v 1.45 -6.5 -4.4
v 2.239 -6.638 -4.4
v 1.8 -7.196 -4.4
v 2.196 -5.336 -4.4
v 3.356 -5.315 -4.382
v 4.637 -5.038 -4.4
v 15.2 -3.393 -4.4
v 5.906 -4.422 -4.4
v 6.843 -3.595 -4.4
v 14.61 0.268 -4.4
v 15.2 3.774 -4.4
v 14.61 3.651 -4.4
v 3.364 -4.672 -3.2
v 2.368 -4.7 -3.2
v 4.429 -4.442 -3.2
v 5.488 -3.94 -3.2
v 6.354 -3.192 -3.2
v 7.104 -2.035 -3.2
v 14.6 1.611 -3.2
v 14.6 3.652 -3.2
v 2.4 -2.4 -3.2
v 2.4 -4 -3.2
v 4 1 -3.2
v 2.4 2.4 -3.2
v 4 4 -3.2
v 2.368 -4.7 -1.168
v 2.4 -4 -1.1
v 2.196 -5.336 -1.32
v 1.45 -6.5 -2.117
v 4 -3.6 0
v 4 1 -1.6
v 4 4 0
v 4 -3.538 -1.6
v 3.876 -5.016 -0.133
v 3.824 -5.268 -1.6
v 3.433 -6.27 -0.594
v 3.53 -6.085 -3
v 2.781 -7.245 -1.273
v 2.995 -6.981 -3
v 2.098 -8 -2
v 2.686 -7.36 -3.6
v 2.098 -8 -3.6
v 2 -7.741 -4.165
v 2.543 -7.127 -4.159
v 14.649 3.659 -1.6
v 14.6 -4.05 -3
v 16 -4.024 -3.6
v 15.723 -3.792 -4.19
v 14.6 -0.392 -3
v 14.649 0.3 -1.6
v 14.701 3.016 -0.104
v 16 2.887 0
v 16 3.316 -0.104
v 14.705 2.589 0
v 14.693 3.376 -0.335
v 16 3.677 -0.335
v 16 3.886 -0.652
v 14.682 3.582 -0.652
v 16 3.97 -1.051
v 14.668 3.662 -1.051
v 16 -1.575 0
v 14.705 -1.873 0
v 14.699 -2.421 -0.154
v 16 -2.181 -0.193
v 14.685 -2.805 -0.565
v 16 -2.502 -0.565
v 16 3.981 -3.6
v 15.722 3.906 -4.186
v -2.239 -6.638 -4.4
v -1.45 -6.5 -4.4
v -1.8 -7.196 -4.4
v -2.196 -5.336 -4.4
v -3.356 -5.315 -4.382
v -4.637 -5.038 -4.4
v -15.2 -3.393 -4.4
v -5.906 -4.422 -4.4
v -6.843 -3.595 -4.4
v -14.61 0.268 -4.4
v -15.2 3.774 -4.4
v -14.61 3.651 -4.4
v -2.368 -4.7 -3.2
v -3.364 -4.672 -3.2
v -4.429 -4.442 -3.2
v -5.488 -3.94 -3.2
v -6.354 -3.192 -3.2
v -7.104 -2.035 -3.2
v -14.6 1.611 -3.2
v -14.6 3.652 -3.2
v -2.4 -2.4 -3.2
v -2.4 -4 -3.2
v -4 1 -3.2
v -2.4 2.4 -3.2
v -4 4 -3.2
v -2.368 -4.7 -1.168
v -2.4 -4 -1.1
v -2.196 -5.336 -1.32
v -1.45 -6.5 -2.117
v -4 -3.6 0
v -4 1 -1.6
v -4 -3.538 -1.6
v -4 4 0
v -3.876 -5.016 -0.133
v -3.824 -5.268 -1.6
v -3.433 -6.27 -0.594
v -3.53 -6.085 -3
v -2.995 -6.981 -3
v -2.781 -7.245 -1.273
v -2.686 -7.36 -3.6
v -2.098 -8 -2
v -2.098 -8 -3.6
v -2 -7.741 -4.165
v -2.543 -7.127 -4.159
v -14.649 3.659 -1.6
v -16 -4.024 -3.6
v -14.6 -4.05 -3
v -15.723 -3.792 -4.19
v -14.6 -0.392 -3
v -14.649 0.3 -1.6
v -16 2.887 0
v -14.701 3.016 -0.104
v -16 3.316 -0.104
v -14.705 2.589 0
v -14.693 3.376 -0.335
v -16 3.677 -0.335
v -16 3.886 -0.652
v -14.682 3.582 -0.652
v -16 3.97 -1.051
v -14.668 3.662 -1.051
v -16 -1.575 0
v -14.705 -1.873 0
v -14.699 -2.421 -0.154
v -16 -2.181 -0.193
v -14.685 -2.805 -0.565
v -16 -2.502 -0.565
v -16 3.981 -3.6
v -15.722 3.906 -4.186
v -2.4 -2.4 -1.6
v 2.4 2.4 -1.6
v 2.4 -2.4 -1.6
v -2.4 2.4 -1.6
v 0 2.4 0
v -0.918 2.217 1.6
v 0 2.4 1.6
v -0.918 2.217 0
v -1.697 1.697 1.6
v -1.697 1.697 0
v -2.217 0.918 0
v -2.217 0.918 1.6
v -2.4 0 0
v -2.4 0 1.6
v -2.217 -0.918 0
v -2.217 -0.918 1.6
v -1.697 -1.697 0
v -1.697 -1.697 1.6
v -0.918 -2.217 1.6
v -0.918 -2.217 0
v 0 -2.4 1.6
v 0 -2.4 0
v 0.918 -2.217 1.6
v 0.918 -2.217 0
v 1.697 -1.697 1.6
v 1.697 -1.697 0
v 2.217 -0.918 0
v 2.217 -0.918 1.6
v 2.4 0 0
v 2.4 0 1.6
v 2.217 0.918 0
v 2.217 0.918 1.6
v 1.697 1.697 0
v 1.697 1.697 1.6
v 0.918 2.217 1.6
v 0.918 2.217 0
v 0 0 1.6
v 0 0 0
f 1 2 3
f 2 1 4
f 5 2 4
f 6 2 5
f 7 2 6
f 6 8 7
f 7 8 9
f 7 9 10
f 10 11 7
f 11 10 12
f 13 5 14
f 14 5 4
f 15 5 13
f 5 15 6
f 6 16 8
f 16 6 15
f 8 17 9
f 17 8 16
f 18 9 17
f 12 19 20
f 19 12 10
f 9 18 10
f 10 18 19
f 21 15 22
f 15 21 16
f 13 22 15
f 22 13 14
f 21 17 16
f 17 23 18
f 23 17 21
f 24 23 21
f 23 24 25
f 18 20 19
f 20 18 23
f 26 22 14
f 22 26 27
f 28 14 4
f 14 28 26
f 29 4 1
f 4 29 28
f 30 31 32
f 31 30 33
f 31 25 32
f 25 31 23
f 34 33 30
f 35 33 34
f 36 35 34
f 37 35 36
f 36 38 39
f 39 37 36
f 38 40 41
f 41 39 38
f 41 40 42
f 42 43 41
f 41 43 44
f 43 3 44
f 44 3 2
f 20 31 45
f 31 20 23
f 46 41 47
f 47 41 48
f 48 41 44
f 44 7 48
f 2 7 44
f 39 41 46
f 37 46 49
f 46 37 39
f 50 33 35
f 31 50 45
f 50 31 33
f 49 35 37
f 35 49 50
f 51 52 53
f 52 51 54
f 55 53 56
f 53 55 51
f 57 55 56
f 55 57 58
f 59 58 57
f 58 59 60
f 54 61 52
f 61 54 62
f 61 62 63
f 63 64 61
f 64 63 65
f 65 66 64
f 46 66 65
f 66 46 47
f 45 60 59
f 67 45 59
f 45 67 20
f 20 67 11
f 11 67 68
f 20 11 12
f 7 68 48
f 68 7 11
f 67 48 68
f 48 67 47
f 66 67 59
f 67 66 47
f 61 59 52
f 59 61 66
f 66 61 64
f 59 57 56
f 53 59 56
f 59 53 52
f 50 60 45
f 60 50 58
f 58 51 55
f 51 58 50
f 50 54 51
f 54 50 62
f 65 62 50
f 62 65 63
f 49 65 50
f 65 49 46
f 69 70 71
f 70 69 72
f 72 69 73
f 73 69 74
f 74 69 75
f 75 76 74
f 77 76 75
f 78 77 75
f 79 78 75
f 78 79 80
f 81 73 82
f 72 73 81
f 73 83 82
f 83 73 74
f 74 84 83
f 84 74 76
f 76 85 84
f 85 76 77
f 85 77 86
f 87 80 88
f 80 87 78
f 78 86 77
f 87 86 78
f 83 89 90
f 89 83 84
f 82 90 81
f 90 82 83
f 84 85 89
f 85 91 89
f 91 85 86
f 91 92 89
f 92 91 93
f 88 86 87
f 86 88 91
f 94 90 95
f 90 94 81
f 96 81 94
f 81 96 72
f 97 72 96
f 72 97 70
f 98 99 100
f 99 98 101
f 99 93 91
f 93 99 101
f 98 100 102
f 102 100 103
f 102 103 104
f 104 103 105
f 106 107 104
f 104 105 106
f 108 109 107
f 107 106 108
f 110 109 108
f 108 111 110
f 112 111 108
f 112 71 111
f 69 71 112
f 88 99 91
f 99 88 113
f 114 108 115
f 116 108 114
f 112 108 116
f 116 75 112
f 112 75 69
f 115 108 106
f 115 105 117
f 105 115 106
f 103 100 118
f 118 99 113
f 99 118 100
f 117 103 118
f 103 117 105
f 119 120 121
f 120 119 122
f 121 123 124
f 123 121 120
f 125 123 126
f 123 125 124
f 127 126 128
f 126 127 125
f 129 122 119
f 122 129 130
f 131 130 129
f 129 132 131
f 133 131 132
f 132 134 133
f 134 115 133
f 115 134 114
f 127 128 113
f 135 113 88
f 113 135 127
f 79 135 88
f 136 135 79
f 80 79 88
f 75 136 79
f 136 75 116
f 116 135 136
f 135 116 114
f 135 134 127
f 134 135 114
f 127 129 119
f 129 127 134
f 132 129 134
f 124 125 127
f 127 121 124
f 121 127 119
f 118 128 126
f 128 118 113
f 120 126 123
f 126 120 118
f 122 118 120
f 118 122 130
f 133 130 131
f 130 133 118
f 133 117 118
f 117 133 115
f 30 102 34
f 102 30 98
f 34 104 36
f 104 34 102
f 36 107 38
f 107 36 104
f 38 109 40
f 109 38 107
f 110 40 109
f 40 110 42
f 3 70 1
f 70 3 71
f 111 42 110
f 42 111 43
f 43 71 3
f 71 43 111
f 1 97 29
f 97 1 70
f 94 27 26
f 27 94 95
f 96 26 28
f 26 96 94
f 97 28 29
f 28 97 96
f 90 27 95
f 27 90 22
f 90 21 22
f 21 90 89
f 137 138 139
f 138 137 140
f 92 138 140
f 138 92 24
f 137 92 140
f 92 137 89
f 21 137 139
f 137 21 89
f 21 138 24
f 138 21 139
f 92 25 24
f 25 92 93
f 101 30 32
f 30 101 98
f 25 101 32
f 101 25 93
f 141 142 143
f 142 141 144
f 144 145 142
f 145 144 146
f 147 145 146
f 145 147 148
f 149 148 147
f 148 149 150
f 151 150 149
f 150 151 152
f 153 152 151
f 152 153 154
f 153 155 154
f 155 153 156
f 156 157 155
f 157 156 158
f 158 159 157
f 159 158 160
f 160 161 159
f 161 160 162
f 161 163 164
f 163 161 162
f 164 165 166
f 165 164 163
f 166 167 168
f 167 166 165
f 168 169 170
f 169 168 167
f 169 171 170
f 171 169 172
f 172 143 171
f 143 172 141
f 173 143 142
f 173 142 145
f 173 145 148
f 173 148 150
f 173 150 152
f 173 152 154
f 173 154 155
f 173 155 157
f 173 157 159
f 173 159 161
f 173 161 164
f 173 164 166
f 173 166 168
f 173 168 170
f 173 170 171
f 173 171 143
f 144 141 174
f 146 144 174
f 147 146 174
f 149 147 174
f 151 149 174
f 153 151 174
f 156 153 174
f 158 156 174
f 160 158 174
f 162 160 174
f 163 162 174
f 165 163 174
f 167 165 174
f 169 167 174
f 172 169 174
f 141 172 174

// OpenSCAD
// file: ../p/4-4edge.scad
use <../lib.scad>
function ldraw_lib__4_4edge() = [
// 0 Circle 1.0
// 0 Name: 4-4edge.dat
// 0 Author: James Jessiman
// 0 !LDRAW_ORG Primitive UPDATE 2017-01
// 0 !LICENSE Licensed under CC BY 2.0 and CC BY 4.0 : see CAreadme.txt
// 
// 0 BFC CERTIFY CCW
  [0,"BFC","CERTIFY"],
  [0,"BFC","CCW"],
// 
// 0 !HISTORY 1998-12-15 [PTadmin] Official Update 1998-10
// 0 !HISTORY 2005-12-28 [PTadmin] Official Update 2005-01
// 0 !HISTORY 2007-06-24 [PTadmin] Header formatted for Contributor Agreement
// 0 !HISTORY 2008-07-01 [PTadmin] Official Update 2008-01
// 0 !HISTORY 2017-01-15 [Steffen] BFCed
// 0 !HISTORY 2017-12-30 [PTadmin] Official Update 2017-01
// 
// 
// 2 24 1 0 0 0.9239 0 0.3827
  [2,24,1,0,0,0.9239,0,0.3827],
// 2 24 0.9239 0 0.3827 0.7071 0 0.7071
  [2,24,0.9239,0,0.3827,0.7071,0,0.7071],
// 2 24 0.7071 0 0.7071 0.3827 0 0.9239
  [2,24,0.7071,0,0.7071,0.3827,0,0.9239],
// 2 24 0.3827 0 0.9239 0 0 1
  [2,24,0.3827,0,0.9239,0,0,1],
// 2 24 0 0 1 -0.3827 0 0.9239
  [2,24,0,0,1,-0.3827,0,0.9239],
// 2 24 -0.3827 0 0.9239 -0.7071 0 0.7071
  [2,24,-0.3827,0,0.9239,-0.7071,0,0.7071],
// 2 24 -0.7071 0 0.7071 -0.9239 0 0.3827
  [2,24,-0.7071,0,0.7071,-0.9239,0,0.3827],
// 2 24 -0.9239 0 0.3827 -1 0 -0
  [2,24,-0.9239,0,0.3827,-1,0,-0],
// 2 24 -1 0 -0 -0.9239 0 -0.3827
  [2,24,-1,0,-0,-0.9239,0,-0.3827],
// 2 24 -0.9239 0 -0.3827 -0.7071 0 -0.7071
  [2,24,-0.9239,0,-0.3827,-0.7071,0,-0.7071],
// 2 24 -0.7071 0 -0.7071 -0.3827 0 -0.9239
  [2,24,-0.7071,0,-0.7071,-0.3827,0,-0.9239],
// 2 24 -0.3827 0 -0.9239 0 0 -1
  [2,24,-0.3827,0,-0.9239,0,0,-1],
// 2 24 0 0 -1 0.3827 0 -0.9239
  [2,24,0,0,-1,0.3827,0,-0.9239],
// 2 24 0.3827 0 -0.9239 0.7071 0 -0.7071
  [2,24,0.3827,0,-0.9239,0.7071,0,-0.7071],
// 2 24 0.7071 0 -0.7071 0.9239 0 -0.3827
  [2,24,0.7071,0,-0.7071,0.9239,0,-0.3827],
// 2 24 0.9239 0 -0.3827 1 0 0
  [2,24,0.9239,0,-0.3827,1,0,0],
];
module ldraw_lib__4_4edge(step=0, col=false, unit=2/5, alt=false, line=0.2, solid=!$preview)
    makepoly(ldraw_lib__4_4edge(), step=step, col=col, unit=unit, alt=alt, line=line, solid=solid);
ldraw_lib__4_4edge(line=0.2);
// file: ../p/4-4disc.scad
use <../lib.scad>
function ldraw_lib__4_4disc() = [
// 0 Disc 1.0
// 0 Name: 4-4disc.dat
// 0 Author: James Jessiman
// 0 !LDRAW_ORG Primitive UPDATE 2002-02
// 0 !LICENSE Licensed under CC BY 2.0 and CC BY 4.0 : see CAreadme.txt
// 
// 0 BFC CERTIFY CCW
  [0,"BFC","CERTIFY"],
  [0,"BFC","CCW"],
// 
// 0 !HISTORY 1998-12-15 [PTadmin] Official Update 1998-10
// 0 !HISTORY 2002-03-23 [sbliss] Added BFC statement
// 0 !HISTORY 2002-04-25 [PTadmin] Official Update 2002-02
// 0 !HISTORY 2007-06-24 [PTadmin] Header formatted for Contributor Agreement
// 0 !HISTORY 2008-07-01 [PTadmin] Official Update 2008-01
// 
// 
// 3 16 0 0 0 1 0 0 0.9239 0 0.3827
  [3,16,0,0,0,1,0,0,0.9239,0,0.3827],
// 3 16 0 0 0 0.9239 0 0.3827 0.7071 0 0.7071
  [3,16,0,0,0,0.9239,0,0.3827,0.7071,0,0.7071],
// 3 16 0 0 0 0.7071 0 0.7071 0.3827 0 0.9239
  [3,16,0,0,0,0.7071,0,0.7071,0.3827,0,0.9239],
// 3 16 0 0 0 0.3827 0 0.9239 0 0 1
  [3,16,0,0,0,0.3827,0,0.9239,0,0,1],
// 3 16 0 0 0 0 0 1 -0.3827 0 0.9239
  [3,16,0,0,0,0,0,1,-0.3827,0,0.9239],
// 3 16 0 0 0 -0.3827 0 0.9239 -0.7071 0 0.7071
  [3,16,0,0,0,-0.3827,0,0.9239,-0.7071,0,0.7071],
// 3 16 0 0 0 -0.7071 0 0.7071 -0.9239 0 0.3827
  [3,16,0,0,0,-0.7071,0,0.7071,-0.9239,0,0.3827],
// 3 16 0 0 0 -0.9239 0 0.3827 -1 0 -0
  [3,16,0,0,0,-0.9239,0,0.3827,-1,0,-0],
// 3 16 0 0 0 -1 0 -0 -0.9239 0 -0.3827
  [3,16,0,0,0,-1,0,-0,-0.9239,0,-0.3827],
// 3 16 0 0 0 -0.9239 0 -0.3827 -0.7071 0 -0.7071
  [3,16,0,0,0,-0.9239,0,-0.3827,-0.7071,0,-0.7071],
// 3 16 0 0 0 -0.7071 0 -0.7071 -0.3827 0 -0.9239
  [3,16,0,0,0,-0.7071,0,-0.7071,-0.3827,0,-0.9239],
// 3 16 0 0 0 -0.3827 0 -0.9239 0 0 -1
  [3,16,0,0,0,-0.3827,0,-0.9239,0,0,-1],
// 3 16 0 0 0 0 0 -1 0.3827 0 -0.9239
  [3,16,0,0,0,0,0,-1,0.3827,0,-0.9239],
// 3 16 0 0 0 0.3827 0 -0.9239 0.7071 0 -0.7071
  [3,16,0,0,0,0.3827,0,-0.9239,0.7071,0,-0.7071],
// 3 16 0 0 0 0.7071 0 -0.7071 0.9239 0 -0.3827
  [3,16,0,0,0,0.7071,0,-0.7071,0.9239,0,-0.3827],
// 3 16 0 0 0 0.9239 0 -0.3827 1 0 0
  [3,16,0,0,0,0.9239,0,-0.3827,1,0,0],
// 0
];
module ldraw_lib__4_4disc(step=0, col=false, unit=2/5, alt=false, line=0.2, solid=!$preview)
    makepoly(ldraw_lib__4_4disc(), step=step, col=col, unit=unit, alt=alt, line=line, solid=solid);
ldraw_lib__4_4disc(line=0.2);
// file: ../p/4-4cyli.scad
use <../lib.scad>
$fa=1; $fs=0.2;
function ldraw_lib__4_4cyli(realsolid=false) = [
// 0 Cylinder 1.0
// 0 Name: 4-4cyli.dat
// 0 Author: James Jessiman
// 0 !LDRAW_ORG Primitive UPDATE 2005-01
// 0 !LICENSE Licensed under CC BY 2.0 and CC BY 4.0 : see CAreadme.txt
// 
// 0 BFC CERTIFY CCW
  [0,"BFC","CERTIFY"],
  [0,"BFC","CCW"],
// 
// 0 !HISTORY 1998-12-15 [PTadmin] Official Update 1998-10
// 0 !HISTORY 2002-03-23 [sbliss] Added BFC statement; merged headers from files in distributions LDraw 0.27 and Complete.
// 0 !HISTORY 2002-04-25 [PTadmin] Official Update 2002-02
// 0 !HISTORY 2004-12-14 [guyvivan] BFC CCW
// 0 !HISTORY 2005-12-28 [PTadmin] Official Update 2005-01
// 0 !HISTORY 2007-06-24 [PTadmin] Header formatted for Contributor Agreement
// 0 !HISTORY 2008-07-01 [PTadmin] Official Update 2008-01
// 
// 
// 4 16 1 1 0 0.9239 1 0.3827 0.9239 0 0.3827 1 0 0
  [4,16,1,1,0,0.9239,1,0.3827,0.9239,0,0.3827,1,0,0],
// 5 24 1 0 0 1 1 0 0.9239 0 0.3827 0.9239 0 -0.3827
  [5,24,1,0,0,1,1,0,0.9239,0,0.3827,0.9239,0,-0.3827],
// 4 16 0.9239 1 0.3827 0.7071 1 0.7071 0.7071 0 0.7071 0.9239 0 0.3827
  [4,16,0.9239,1,0.3827,0.7071,1,0.7071,0.7071,0,0.7071,0.9239,0,0.3827],
// 5 24 0.9239 0 0.3827 0.9239 1 0.3827 0.7071 0 0.7071 1 0 0
  [5,24,0.9239,0,0.3827,0.9239,1,0.3827,0.7071,0,0.7071,1,0,0],
// 4 16 0.7071 1 0.7071 0.3827 1 0.9239 0.3827 0 0.9239 0.7071 0 0.7071
  [4,16,0.7071,1,0.7071,0.3827,1,0.9239,0.3827,0,0.9239,0.7071,0,0.7071],
// 5 24 0.7071 0 0.7071 0.7071 1 0.7071 0.3827 0 0.9239 0.9239 0 0.3827
  [5,24,0.7071,0,0.7071,0.7071,1,0.7071,0.3827,0,0.9239,0.9239,0,0.3827],
// 4 16 0.3827 1 0.9239 0 1 1 0 0 1 0.3827 0 0.9239
  [4,16,0.3827,1,0.9239,0,1,1,0,0,1,0.3827,0,0.9239],
// 5 24 0.3827 0 0.9239 0.3827 1 0.9239 0 0 1 0.7071 0 0.7071
  [5,24,0.3827,0,0.9239,0.3827,1,0.9239,0,0,1,0.7071,0,0.7071],
// 4 16 0 1 1 -0.3827 1 0.9239 -0.3827 0 0.9239 0 0 1
  [4,16,0,1,1,-0.3827,1,0.9239,-0.3827,0,0.9239,0,0,1],
// 5 24 0 0 1 0 1 1 -0.3827 0 0.9239 0.3827 0 0.9239
  [5,24,0,0,1,0,1,1,-0.3827,0,0.9239,0.3827,0,0.9239],
// 4 16 -0.3827 1 0.9239 -0.7071 1 0.7071 -0.7071 0 0.7071 -0.3827 0 0.9239
  [4,16,-0.3827,1,0.9239,-0.7071,1,0.7071,-0.7071,0,0.7071,-0.3827,0,0.9239],
// 5 24 -0.3827 0 0.9239 -0.3827 1 0.9239 -0.7071 0 0.7071 0 0 1
  [5,24,-0.3827,0,0.9239,-0.3827,1,0.9239,-0.7071,0,0.7071,0,0,1],
// 4 16 -0.7071 1 0.7071 -0.9239 1 0.3827 -0.9239 0 0.3827 -0.7071 0 0.7071
  [4,16,-0.7071,1,0.7071,-0.9239,1,0.3827,-0.9239,0,0.3827,-0.7071,0,0.7071],
// 5 24 -0.7071 0 0.7071 -0.7071 1 0.7071 -0.9239 0 0.3827 -0.3827 0 0.9239
  [5,24,-0.7071,0,0.7071,-0.7071,1,0.7071,-0.9239,0,0.3827,-0.3827,0,0.9239],
// 4 16 -0.9239 1 0.3827 -1 1 0 -1 0 0 -0.9239 0 0.3827
  [4,16,-0.9239,1,0.3827,-1,1,0,-1,0,0,-0.9239,0,0.3827],
// 5 24 -0.9239 0 0.3827 -0.9239 1 0.3827 -1 0 0 -0.7071 0 0.7071
  [5,24,-0.9239,0,0.3827,-0.9239,1,0.3827,-1,0,0,-0.7071,0,0.7071],
// 4 16 -1 1 0 -0.9239 1 -0.3827 -0.9239 0 -0.3827 -1 0 0
  [4,16,-1,1,0,-0.9239,1,-0.3827,-0.9239,0,-0.3827,-1,0,0],
// 5 24 -1 0 0 -1 1 0 -0.9239 0 -0.3827 -0.9239 0 0.3827
  [5,24,-1,0,0,-1,1,0,-0.9239,0,-0.3827,-0.9239,0,0.3827],
// 4 16 -0.9239 1 -0.3827 -0.7071 1 -0.7071 -0.7071 0 -0.7071 -0.9239 0 -0.3827
  [4,16,-0.9239,1,-0.3827,-0.7071,1,-0.7071,-0.7071,0,-0.7071,-0.9239,0,-0.3827],
// 5 24 -0.9239 0 -0.3827 -0.9239 1 -0.3827 -0.7071 0 -0.7071 -1 0 0
  [5,24,-0.9239,0,-0.3827,-0.9239,1,-0.3827,-0.7071,0,-0.7071,-1,0,0],
// 4 16 -0.7071 1 -0.7071 -0.3827 1 -0.9239 -0.3827 0 -0.9239 -0.7071 0 -0.7071
  [4,16,-0.7071,1,-0.7071,-0.3827,1,-0.9239,-0.3827,0,-0.9239,-0.7071,0,-0.7071],
// 5 24 -0.7071 0 -0.7071 -0.7071 1 -0.7071 -0.3827 0 -0.9239 -0.9239 0 -0.3827
  [5,24,-0.7071,0,-0.7071,-0.7071,1,-0.7071,-0.3827,0,-0.9239,-0.9239,0,-0.3827],
// 4 16 -0.3827 1 -0.9239 0 1 -1 0 0 -1 -0.3827 0 -0.9239
  [4,16,-0.3827,1,-0.9239,0,1,-1,0,0,-1,-0.3827,0,-0.9239],
// 5 24 -0.3827 0 -0.9239 -0.3827 1 -0.9239 0 0 -1 -0.7071 0 -0.7071
  [5,24,-0.3827,0,-0.9239,-0.3827,1,-0.9239,0,0,-1,-0.7071,0,-0.7071],
// 4 16 0 1 -1 0.3827 1 -0.9239 0.3827 0 -0.9239 0 0 -1
  [4,16,0,1,-1,0.3827,1,-0.9239,0.3827,0,-0.9239,0,0,-1],
// 5 24 0 0 -1 0 1 -1 0.3827 0 -0.9239 -0.3827 0 -0.9239
  [5,24,0,0,-1,0,1,-1,0.3827,0,-0.9239,-0.3827,0,-0.9239],
// 4 16 0.3827 1 -0.9239 0.7071 1 -0.7071 0.7071 0 -0.7071 0.3827 0 -0.9239
  [4,16,0.3827,1,-0.9239,0.7071,1,-0.7071,0.7071,0,-0.7071,0.3827,0,-0.9239],
// 5 24 0.3827 0 -0.9239 0.3827 1 -0.9239 0.7071 0 -0.7071 0 0 -1
  [5,24,0.3827,0,-0.9239,0.3827,1,-0.9239,0.7071,0,-0.7071,0,0,-1],
// 4 16 0.7071 1 -0.7071 0.9239 1 -0.3827 0.9239 0 -0.3827 0.7071 0 -0.7071
  [4,16,0.7071,1,-0.7071,0.9239,1,-0.3827,0.9239,0,-0.3827,0.7071,0,-0.7071],
// 5 24 0.7071 0 -0.7071 0.7071 1 -0.7071 0.9239 0 -0.3827 0.3827 0 -0.9239
  [5,24,0.7071,0,-0.7071,0.7071,1,-0.7071,0.9239,0,-0.3827,0.3827,0,-0.9239],
// 4 16 0.9239 1 -0.3827 1 1 0 1 0 0 0.9239 0 -0.3827
  [4,16,0.9239,1,-0.3827,1,1,0,1,0,0,0.9239,0,-0.3827],
// 5 24 0.9239 0 -0.3827 0.9239 1 -0.3827 1 0 0 0.7071 0 -0.7071
  [5,24,0.9239,0,-0.3827,0.9239,1,-0.3827,1,0,0,0.7071,0,-0.7071],
// 0
];
module ldraw_lib__4_4cyli(step=0, col=false, unit=2/5, alt=false, line=0.2, solid=!$preview)
    makepoly(ldraw_lib__4_4cyli(solid), step=step, col=col, unit=unit, alt=alt, line=line, solid=solid);
ldraw_lib__4_4cyli(line=0.2);
// file: ../p/stud.scad
use <../lib.scad>
use <4-4cyli.scad>
use <4-4disc.scad>
use <4-4edge.scad>
function ldraw_lib__stud() = [
// 0 Stud
// 0 Name: stud.dat
// 0 Author: James Jessiman
// 0 !LDRAW_ORG Primitive UPDATE 2012-01
// 0 !LICENSE Licensed under CC BY 4.0 : see CAreadme.txt
// 
// 0 BFC CERTIFY CCW
  [0,"BFC","CERTIFY"],
  [0,"BFC","CCW"],
// 
// 0 !HISTORY 2002-04-04 [sbliss] Modified for BFC compliance
// 0 !HISTORY 2002-04-25 [PTadmin] Official Update 2002-02
// 0 !HISTORY 2007-06-24 [PTadmin] Header formatted for Contributor Agreement
// 0 !HISTORY 2008-07-01 [PTadmin] Official Update 2008-01
// 0 !HISTORY 2012-02-16 [Philo] Changed to CCW
// 0 !HISTORY 2012-03-30 [PTadmin] Official Update 2012-01
// 
// 
// 1 16 0 0 0 6 0 0 0 1 0 0 0 6 4-4edge.dat
  [1,16,0,0,0,6,0,0,0,1,0,0,0,6, ldraw_lib__4_4edge()],
// 1 16 0 -4 0 6 0 0 0 1 0 0 0 6 4-4edge.dat
  [1,16,0,-4,0,6,0,0,0,1,0,0,0,6, ldraw_lib__4_4edge()],
// 1 16 0 0 0 6 0 0 0 -4 0 0 0 6 4-4cyli.dat
  [1,16,0,0,0,6,0,0,0,-4,0,0,0,6, ldraw_lib__4_4cyli()],
// 1 16 0 -4 0 6 0 0 0 1 0 0 0 6 4-4disc.dat
  [1,16,0,-4,0,6,0,0,0,1,0,0,0,6, ldraw_lib__4_4disc()],
  [-1,16,0,0,0,6,0,0,0,-1,0,0,0,6, ldraw_lib__4_4disc()],
];
module ldraw_lib__stud(step=0, col=false, unit=2/5, alt=false, line=0.2, solid=!$preview)
    makepoly(ldraw_lib__stud(), step=step, col=col, unit=unit, alt=alt, line=line, solid=solid);
ldraw_lib__stud(line=0.2);
// file: ../p/recte3.scad
use <../lib.scad>
$fa=1; $fs=0.2;
function ldraw_lib__recte3(realsolid=false) = [
// 0 Rectangle Empty with 3 Edges
// 0 Name: recte3.dat
// 0 Author: Steffen [Steffen]
// 0 !LDRAW_ORG Primitive UPDATE 2011-01
// 0 !LICENSE Licensed under CC BY 2.0 and CC BY 4.0 : see CAreadme.txt
// 
// 0 BFC CERTIFY CCW
  [0,"BFC","CERTIFY"],
  [0,"BFC","CCW"],
// 
// 0 !HISTORY 2011-07-25 [PTadmin] Official Update 2011-01
// 
// 
// 2 24 1 0 1 -1 0 1
  [2,24,1,0,1,-1,0,1],
// 2 24 -1 0 1 -1 0 -1
  [2,24,-1,0,1,-1,0,-1],
// 2 24 1 0 -1 1 0 1
  [2,24,1,0,-1,1,0,1],
];
module ldraw_lib__recte3(step=0, col=false, unit=2/5, alt=false, line=0.2, solid=!$preview)
    makepoly(ldraw_lib__recte3(solid), step=step, col=col, unit=unit, alt=alt, line=line, solid=solid);
ldraw_lib__recte3(line=0.2);
// file: ../p/rect3.scad
use <../lib.scad>
function ldraw_lib__rect3() = [
// 0 Rectangle with 3 Edges
// 0 Name: rect3.dat
// 0 Author: Mark Kennedy [mkennedy]
// 0 !LDRAW_ORG Primitive UPDATE 2010-01
// 0 !LICENSE Licensed under CC BY 4.0 : see CAreadme.txt
// 
// 0 BFC CERTIFY CCW
  [0,"BFC","CERTIFY"],
  [0,"BFC","CCW"],
// 
// 0 !HISTORY 2003-08-01 [PTadmin] Official Update 2003-02
// 0 !HISTORY 2007-06-24 [PTadmin] Header formatted for Contributor Agreement
// 0 !HISTORY 2008-07-01 [PTadmin] Official Update 2008-01
// 0 !HISTORY 2010-01-17 [mikeheide] Change winding to CCW
// 0 !HISTORY 2010-04-05 [PTadmin] Official Update 2010-01
// 
// 
// 2 24 1 0 1 -1 0 1
  [2,24,1,0,1,-1,0,1],
// 2 24 1 0 1 1 0 -1
  [2,24,1,0,1,1,0,-1],
// 2 24 -1 0 1 -1 0 -1
  [2,24,-1,0,1,-1,0,-1],
// 4 16 -1 0 1 -1 0 -1 1 0 -1 1 0 1
  [4,16,-1,0,1,-1,0,-1,1,0,-1,1,0,1],
// 0 //
];
module ldraw_lib__rect3(step=0, col=false, unit=2/5, alt=false, line=0.2, solid=!$preview)
    makepoly(ldraw_lib__rect3(), step=step, col=col, unit=unit, alt=alt, line=line, solid=solid);
ldraw_lib__rect3(line=0.2);
// file: ../p/rect.scad
use <../lib.scad>
function ldraw_lib__rect() = [
// 0 Rectangle
// 0 Name: rect.dat
// 0 Author: James Jessiman
// 0 !LDRAW_ORG Primitive UPDATE 2010-01
// 0 !LICENSE Licensed under CC BY 2.0 and CC BY 4.0 : see CAreadme.txt
// 
// 0 BFC CERTIFY CCW
  [0,"BFC","CERTIFY"],
  [0,"BFC","CCW"],
// 
// 0 !HISTORY 2002-04-05 [hafhead] Added BFC statement
// 0 !HISTORY 2002-04-25 [PTadmin] Official Update 2002-02
// 0 !HISTORY 2007-06-24 [PTadmin] Header formatted for Contributor Agreement
// 0 !HISTORY 2008-07-01 [PTadmin] Official Update 2008-01
// 0 !HISTORY 2010-01-17 [mikeheide] changed winding to CCW
// 0 !HISTORY 2010-04-05 [PTadmin] Official Update 2010-01
// 
// 
// 2 24 1 0 1 -1 0 1
  [2,24,1,0,1,-1,0,1],
// 2 24 -1 0 1 -1 0 -1
  [2,24,-1,0,1,-1,0,-1],
// 2 24 -1 0 -1 1 0 -1
  [2,24,-1,0,-1,1,0,-1],
// 2 24 1 0 -1 1 0 1
  [2,24,1,0,-1,1,0,1],
// 4 16 -1 0 1 -1 0 -1 1 0 -1 1 0 1
  [4,16,-1,0,1,-1,0,-1,1,0,-1,1,0,1],
// 0
];
makepoly(ldraw_lib__rect(), line=0.2);
// file: ../p/box5.scad
use <../lib.scad>
function ldraw_lib__box5() = [
// 0 Box with 5 Faces and All Edges
// 0 Name: box5.dat
// 0 Author: James Jessiman
// 0 !LDRAW_ORG Primitive UPDATE 2012-01
// 0 !LICENSE Licensed under CC BY 2.0 and CC BY 4.0 : see CAreadme.txt
// 
// 0 BFC CERTIFY CCW
  [0,"BFC","CERTIFY"],
  [0,"BFC","CCW"],
// 
// 0 !HISTORY 2002-04-03 [sbliss] Modified for BFC compliance
// 0 !HISTORY 2002-04-25 [PTadmin] Official Update 2002-02
// 0 !HISTORY 2007-06-24 [PTadmin] Header formatted for Contributor Agreement
// 0 !HISTORY 2008-07-01 [PTadmin] Official Update 2008-01
// 0 !HISTORY 2012-02-16 [Philo] Changed to CCW
// 0 !HISTORY 2012-03-30 [PTadmin] Official Update 2012-01
// 
// 
// 2 24 1 1 1 -1 1 1
  [2,24,1,1,1,-1,1,1],
// 2 24 -1 1 1 -1 1 -1
  [2,24,-1,1,1,-1,1,-1],
// 2 24 -1 1 -1 1 1 -1
  [2,24,-1,1,-1,1,1,-1],
// 2 24 1 1 -1 1 1 1
  [2,24,1,1,-1,1,1,1],
// 2 24 1 0 1 -1 0 1
  [2,24,1,0,1,-1,0,1],
// 2 24 -1 0 1 -1 0 -1
  [2,24,-1,0,1,-1,0,-1],
// 2 24 -1 0 -1 1 0 -1
  [2,24,-1,0,-1,1,0,-1],
// 2 24 1 0 -1 1 0 1
  [2,24,1,0,-1,1,0,1],
// 2 24 1 0 1 1 1 1
  [2,24,1,0,1,1,1,1],
// 2 24 -1 0 1 -1 1 1
  [2,24,-1,0,1,-1,1,1],
// 2 24 1 0 -1 1 1 -1
  [2,24,1,0,-1,1,1,-1],
// 2 24 -1 0 -1 -1 1 -1
  [2,24,-1,0,-1,-1,1,-1],
// 4 16 -1 1 1 1 1 1 1 1 -1 -1 1 -1
  [4,16,-1,1,1,1,1,1,1,1,-1,-1,1,-1],
// 4 16 -1 1 1 -1 0 1 1 0 1 1 1 1
  [4,16,-1,1,1,-1,0,1,1,0,1,1,1,1],
// 4 16 -1 1 -1 -1 0 -1 -1 0 1 -1 1 1
  [4,16,-1,1,-1,-1,0,-1,-1,0,1,-1,1,1],
// 4 16 1 1 -1 1 0 -1 -1 0 -1 -1 1 -1
  [4,16,1,1,-1,1,0,-1,-1,0,-1,-1,1,-1],
// 4 16 1 1 1 1 0 1 1 0 -1 1 1 -1
  [4,16,1,1,1,1,0,1,1,0,-1,1,1,-1],
];
makepoly(ldraw_lib__box5(), line=0.2);
// file: ../p/box2-7.scad
use <../lib.scad>
function ldraw_lib__box2_7() = [
// 0 Box with  2 Faces without  7 Edges
// 0 Name: box2-7.dat
// 0 Author: Willy Tschager [Holly-Wood]
// 0 !LDRAW_ORG Primitive UPDATE 2024-01
// 0 !LICENSE Licensed under CC BY 4.0 : see CAreadme.txt
// 
// 0 BFC CERTIFY CCW
  [0,"BFC","CERTIFY"],
  [0,"BFC","CCW"],
// 
// 0 !HISTORY 2009-05-02 [PTadmin] Official Update 2009-01
// 0 !HISTORY 2024-01-02 [Holly-Wood] Complete re-write, original by guyvivan
// 0 !HISTORY 2024-01-29 [OrionP] Official Update 2024-01
// 
// 2 24 -1 1 -1 -1 1 1
  [2,24,-1,1,-1,-1,1,1],
// 2 24 1 1 1 1 1 -1
  [2,24,1,1,1,1,1,-1],
// 4 16 -1 1 1 1 1 1 1 1 -1 -1 1 -1
  [4,16,-1,1,1,1,1,1,1,1,-1,-1,1,-1],
// 
// 2 24 -1 1 1 -1 -1 1
  [2,24,-1,1,1,-1,-1,1],
// 2 24 1 1 1 1 -1 1
  [2,24,1,1,1,1,-1,1],
// 4 16 1 -1 1 1 1 1 -1 1 1 -1 -1 1
  [4,16,1,-1,1,1,1,1,-1,1,1,-1,-1,1],
// 
// 2 24 -1 1 1 1 1 1
  [2,24,-1,1,1,1,1,1],
];
module ldraw_lib__box2_7(step=0, col=false, unit=2/5, alt=false, line=0.2, solid=!$preview)
    makepoly(ldraw_lib__box2_7(), step=step, col=col, unit=unit, alt=alt, line=line, solid=solid);
ldraw_lib__box2_7(line=0.2);
// main file
use <../lib.scad>
use <../p/box2-7.scad>
use <../p/box5.scad>
use <../p/rect.scad>
use <../p/rect3.scad>
use <../p/recte3.scad>
use <s/6682s01.scad>
use <../p/stud.scad>
function ldraw_lib__6682() = [
// 0 Plate  1 x  1 with  1.5 x  4 Front Spoiler
// 0 Name: 6682.dat
// 0 Author: Gerald Lasser [GeraldLasser]
// 0 !LDRAW_ORG Part UPDATE 2025-05
// 0 !LICENSE Licensed under CC BY 4.0 : see CAreadme.txt
// 
// 0 BFC CERTIFY CCW
  [0,"BFC","CERTIFY"],
  [0,"BFC","CCW"],
// 
// 0 !HISTORY 2025-05-01 {LEGO Instructions App} Original part shape
// 0 !HISTORY 2025-05-01 [GeraldLasser] File preparation for LDraw Parts Tracker
// 0 !HISTORY 2025-05-28 [OrionP] Official Update 2025-05
// 
// 0 // Needs Work: Clean necessary
// 1 16 0 0 0 1 0 0 0 1 0 0 0 1 s\6682s01.dat
  [1,16,0,0,0,1,0,0,0,1,0,0,0,1, ldraw_lib__s__6682s01()],
// 1 16 0 0 0 -1 0 0 0 1 0 0 0 1 s\6682s01.dat
  [1,16,0,0,0,-1,0,0,0,1,0,0,0,1, ldraw_lib__s__6682s01()],
// 
// 4 16 9.691 .333 -12.54 10 0 -9 -10 0 -9 -9.691 .333 -12.54
  [4,16,9.691,.333,-12.54,10,0,-9,-10,0,-9,-9.691,.333,-12.54],
// 4 16 8.583 1.484 -15.675 9.691 .333 -12.54 -9.691 .333 -12.54 -8.583 1.484 -15.675
  [4,16,8.583,1.484,-15.675,9.691,.333,-12.54,-9.691,.333,-12.54,-8.583,1.484,-15.675],
// 4 16 6.952 3.182 -18.113 8.583 1.484 -15.675 -8.583 1.484 -15.675 -6.952 3.182 -18.113
  [4,16,6.952,3.182,-18.113,8.583,1.484,-15.675,-8.583,1.484,-15.675,-6.952,3.182,-18.113],
// 4 16 -6.952 3.182 -18.113 -5.245 5 -20 5.245 5 -20 6.952 3.182 -18.113
  [4,16,-6.952,3.182,-18.113,-5.245,5,-20,5.245,5,-20,6.952,3.182,-18.113],
// 1 16 0 7 -20 5.245 0 0 0 0 -2 0 1 0 rect3.dat
  [1,16,0,7,-20,5.245,0,0,0,0,-2,0,1,0, ldraw_lib__rect3()],
// 4 16 -4.5 11 -17.989 -3.625 11 -16.25 3.625 11 -16.25 4.5 11 -17.989
  [4,16,-4.5,11,-17.989,-3.625,11,-16.25,3.625,11,-16.25,4.5,11,-17.989],
// 4 16 5 10.413 -19.352 5.245 9 -20 -5.245 9 -20 -5 10.413 -19.352
  [4,16,5,10.413,-19.352,5.245,9,-20,-5.245,9,-20,-5,10.413,-19.352],
// 4 16 -5 10.413 -19.352 -4.5 11 -17.989 4.5 11 -17.989 5 10.413 -19.352
  [4,16,-5,10.413,-19.352,-4.5,11,-17.989,4.5,11,-17.989,5,10.413,-19.352],
// 1 16 0 8.1465 -16.25 0 0 3.625 -2.8535 0 0 0 -1 0 rect.dat
  [1,16,0,8.1465,-16.25,0,0,3.625,-2.8535,0,0,0,-1,0, ldraw_lib__rect()],
// 4 16 6 2.75 -10 5.92 2.92 -11.75 -5.92 2.92 -11.75 -6 2.75 -10
  [4,16,6,2.75,-10,5.92,2.92,-11.75,-5.92,2.92,-11.75,-6,2.75,-10],
// 4 16 -5.49 3.3 -13.34 -5.92 2.92 -11.75 5.92 2.92 -11.75 5.49 3.3 -13.34
  [4,16,-5.49,3.3,-13.34,-5.92,2.92,-11.75,5.92,2.92,-11.75,5.49,3.3,-13.34],
// 4 16 -3.625 5.293 -16.25 -5.49 3.3 -13.34 5.49 3.3 -13.34 3.625 5.293 -16.25
  [4,16,-3.625,5.293,-16.25,-5.49,3.3,-13.34,5.49,3.3,-13.34,3.625,5.293,-16.25],
// 1 16 0 5.375 -10 0 0 6 2.625 0 0 0 1 0 rect.dat
  [1,16,0,5.375,-10,0,0,6,2.625,0,0,0,1,0, ldraw_lib__rect()],
// 4 16 -6 8 -6 6 8 -6 6 8 -10 -6 8 -10
  [4,16,-6,8,-6,6,8,-6,6,8,-10,-6,8,-10],
// 1 16 0 8 6.25 10 0 0 0 -4 0 0 0 3.75 recte3.dat
  [1,16,0,8,6.25,10,0,0,0,-4,0,0,0,3.75, ldraw_lib__recte3()],
// 0 BFC INVERTNEXT
  [0,"BFC","INVERTNEXT"],
// 1 16 0 8 0 6 0 0 0 -4 0 0 0 6 box5.dat
  [1,16,0,8,0,6,0,0,0,-4,0,0,0,6, ldraw_lib__box5()],
// 4 16 -10 8 10 10 8 10 6 8 6 -6 8 6
  [4,16,-10,8,10,10,8,10,6,8,6,-6,8,6],
// 1 16 0 4 .5 10 0 0 0 -4 0 0 0 9.5 box2-7.dat
  [1,16,0,4,.5,10,0,0,0,-4,0,0,0,9.5, ldraw_lib__box2_7()],
// 2 24 -4.5 11 -17.989 4.5 11 -17.989
  [2,24,-4.5,11,-17.989,4.5,11,-17.989],
// 5 24 -5.49 3.3 -13.34 5.49 3.3 -13.34 -5.92 2.92 -11.75 3.625 5.293 -16.25
  [5,24,-5.49,3.3,-13.34,5.49,3.3,-13.34,-5.92,2.92,-11.75,3.625,5.293,-16.25],
// 5 24 6.952 3.182 -18.113 -6.952 3.182 -18.113 -5.245 5 -20 8.583 1.484 -15.675
  [5,24,6.952,3.182,-18.113,-6.952,3.182,-18.113,-5.245,5,-20,8.583,1.484,-15.675],
// 5 24 5 10.413 -19.352 -5 10.413 -19.352 -4.5 11 -17.989 5.245 9 -20
  [5,24,5,10.413,-19.352,-5,10.413,-19.352,-4.5,11,-17.989,5.245,9,-20],
// 5 24 -5.92 2.92 -11.75 5.92 2.92 -11.75 5.49 3.3 -13.34 -6 2.75 -10
  [5,24,-5.92,2.92,-11.75,5.92,2.92,-11.75,5.49,3.3,-13.34,-6,2.75,-10],
// 5 24 -8.583 1.484 -15.675 8.583 1.484 -15.675 9.691 .333 -12.54 -6.952 3.182 -18.113
  [5,24,-8.583,1.484,-15.675,8.583,1.484,-15.675,9.691,.333,-12.54,-6.952,3.182,-18.113],
// 5 24 5.245 9 -20 -5.245 9 -20 5.245 5 -20 -5 10.413 -19.352
  [5,24,5.245,9,-20,-5.245,9,-20,5.245,5,-20,-5,10.413,-19.352],
// 5 24 9.691 .333 -12.54 -9.691 .333 -12.54 10 0 -9 -8.583 1.484 -15.675
  [5,24,9.691,.333,-12.54,-9.691,.333,-12.54,10,0,-9,-8.583,1.484,-15.675],
// 5 24 10 0 -9 -10 0 -9 -10 0 10 -9.691 .333 -12.54
  [5,24,10,0,-9,-10,0,-9,-10,0,10,-9.691,.333,-12.54],
// 
// 1 16 0 0 0 0 0 -1 0 1 0 1 0 0 stud.dat
  [1,16,0,0,0,0,0,-1,0,1,0,1,0,0, ldraw_lib__stud()],
];
module ldraw_lib__6682(step=0, col=false, unit=2/5, alt=false, line=0.2, solid=!$preview)
    makepoly(ldraw_lib__6682(), step=step, col=col, unit=unit, alt=alt, line=line, solid=solid);
ldraw_lib__6682(line=0.2);
